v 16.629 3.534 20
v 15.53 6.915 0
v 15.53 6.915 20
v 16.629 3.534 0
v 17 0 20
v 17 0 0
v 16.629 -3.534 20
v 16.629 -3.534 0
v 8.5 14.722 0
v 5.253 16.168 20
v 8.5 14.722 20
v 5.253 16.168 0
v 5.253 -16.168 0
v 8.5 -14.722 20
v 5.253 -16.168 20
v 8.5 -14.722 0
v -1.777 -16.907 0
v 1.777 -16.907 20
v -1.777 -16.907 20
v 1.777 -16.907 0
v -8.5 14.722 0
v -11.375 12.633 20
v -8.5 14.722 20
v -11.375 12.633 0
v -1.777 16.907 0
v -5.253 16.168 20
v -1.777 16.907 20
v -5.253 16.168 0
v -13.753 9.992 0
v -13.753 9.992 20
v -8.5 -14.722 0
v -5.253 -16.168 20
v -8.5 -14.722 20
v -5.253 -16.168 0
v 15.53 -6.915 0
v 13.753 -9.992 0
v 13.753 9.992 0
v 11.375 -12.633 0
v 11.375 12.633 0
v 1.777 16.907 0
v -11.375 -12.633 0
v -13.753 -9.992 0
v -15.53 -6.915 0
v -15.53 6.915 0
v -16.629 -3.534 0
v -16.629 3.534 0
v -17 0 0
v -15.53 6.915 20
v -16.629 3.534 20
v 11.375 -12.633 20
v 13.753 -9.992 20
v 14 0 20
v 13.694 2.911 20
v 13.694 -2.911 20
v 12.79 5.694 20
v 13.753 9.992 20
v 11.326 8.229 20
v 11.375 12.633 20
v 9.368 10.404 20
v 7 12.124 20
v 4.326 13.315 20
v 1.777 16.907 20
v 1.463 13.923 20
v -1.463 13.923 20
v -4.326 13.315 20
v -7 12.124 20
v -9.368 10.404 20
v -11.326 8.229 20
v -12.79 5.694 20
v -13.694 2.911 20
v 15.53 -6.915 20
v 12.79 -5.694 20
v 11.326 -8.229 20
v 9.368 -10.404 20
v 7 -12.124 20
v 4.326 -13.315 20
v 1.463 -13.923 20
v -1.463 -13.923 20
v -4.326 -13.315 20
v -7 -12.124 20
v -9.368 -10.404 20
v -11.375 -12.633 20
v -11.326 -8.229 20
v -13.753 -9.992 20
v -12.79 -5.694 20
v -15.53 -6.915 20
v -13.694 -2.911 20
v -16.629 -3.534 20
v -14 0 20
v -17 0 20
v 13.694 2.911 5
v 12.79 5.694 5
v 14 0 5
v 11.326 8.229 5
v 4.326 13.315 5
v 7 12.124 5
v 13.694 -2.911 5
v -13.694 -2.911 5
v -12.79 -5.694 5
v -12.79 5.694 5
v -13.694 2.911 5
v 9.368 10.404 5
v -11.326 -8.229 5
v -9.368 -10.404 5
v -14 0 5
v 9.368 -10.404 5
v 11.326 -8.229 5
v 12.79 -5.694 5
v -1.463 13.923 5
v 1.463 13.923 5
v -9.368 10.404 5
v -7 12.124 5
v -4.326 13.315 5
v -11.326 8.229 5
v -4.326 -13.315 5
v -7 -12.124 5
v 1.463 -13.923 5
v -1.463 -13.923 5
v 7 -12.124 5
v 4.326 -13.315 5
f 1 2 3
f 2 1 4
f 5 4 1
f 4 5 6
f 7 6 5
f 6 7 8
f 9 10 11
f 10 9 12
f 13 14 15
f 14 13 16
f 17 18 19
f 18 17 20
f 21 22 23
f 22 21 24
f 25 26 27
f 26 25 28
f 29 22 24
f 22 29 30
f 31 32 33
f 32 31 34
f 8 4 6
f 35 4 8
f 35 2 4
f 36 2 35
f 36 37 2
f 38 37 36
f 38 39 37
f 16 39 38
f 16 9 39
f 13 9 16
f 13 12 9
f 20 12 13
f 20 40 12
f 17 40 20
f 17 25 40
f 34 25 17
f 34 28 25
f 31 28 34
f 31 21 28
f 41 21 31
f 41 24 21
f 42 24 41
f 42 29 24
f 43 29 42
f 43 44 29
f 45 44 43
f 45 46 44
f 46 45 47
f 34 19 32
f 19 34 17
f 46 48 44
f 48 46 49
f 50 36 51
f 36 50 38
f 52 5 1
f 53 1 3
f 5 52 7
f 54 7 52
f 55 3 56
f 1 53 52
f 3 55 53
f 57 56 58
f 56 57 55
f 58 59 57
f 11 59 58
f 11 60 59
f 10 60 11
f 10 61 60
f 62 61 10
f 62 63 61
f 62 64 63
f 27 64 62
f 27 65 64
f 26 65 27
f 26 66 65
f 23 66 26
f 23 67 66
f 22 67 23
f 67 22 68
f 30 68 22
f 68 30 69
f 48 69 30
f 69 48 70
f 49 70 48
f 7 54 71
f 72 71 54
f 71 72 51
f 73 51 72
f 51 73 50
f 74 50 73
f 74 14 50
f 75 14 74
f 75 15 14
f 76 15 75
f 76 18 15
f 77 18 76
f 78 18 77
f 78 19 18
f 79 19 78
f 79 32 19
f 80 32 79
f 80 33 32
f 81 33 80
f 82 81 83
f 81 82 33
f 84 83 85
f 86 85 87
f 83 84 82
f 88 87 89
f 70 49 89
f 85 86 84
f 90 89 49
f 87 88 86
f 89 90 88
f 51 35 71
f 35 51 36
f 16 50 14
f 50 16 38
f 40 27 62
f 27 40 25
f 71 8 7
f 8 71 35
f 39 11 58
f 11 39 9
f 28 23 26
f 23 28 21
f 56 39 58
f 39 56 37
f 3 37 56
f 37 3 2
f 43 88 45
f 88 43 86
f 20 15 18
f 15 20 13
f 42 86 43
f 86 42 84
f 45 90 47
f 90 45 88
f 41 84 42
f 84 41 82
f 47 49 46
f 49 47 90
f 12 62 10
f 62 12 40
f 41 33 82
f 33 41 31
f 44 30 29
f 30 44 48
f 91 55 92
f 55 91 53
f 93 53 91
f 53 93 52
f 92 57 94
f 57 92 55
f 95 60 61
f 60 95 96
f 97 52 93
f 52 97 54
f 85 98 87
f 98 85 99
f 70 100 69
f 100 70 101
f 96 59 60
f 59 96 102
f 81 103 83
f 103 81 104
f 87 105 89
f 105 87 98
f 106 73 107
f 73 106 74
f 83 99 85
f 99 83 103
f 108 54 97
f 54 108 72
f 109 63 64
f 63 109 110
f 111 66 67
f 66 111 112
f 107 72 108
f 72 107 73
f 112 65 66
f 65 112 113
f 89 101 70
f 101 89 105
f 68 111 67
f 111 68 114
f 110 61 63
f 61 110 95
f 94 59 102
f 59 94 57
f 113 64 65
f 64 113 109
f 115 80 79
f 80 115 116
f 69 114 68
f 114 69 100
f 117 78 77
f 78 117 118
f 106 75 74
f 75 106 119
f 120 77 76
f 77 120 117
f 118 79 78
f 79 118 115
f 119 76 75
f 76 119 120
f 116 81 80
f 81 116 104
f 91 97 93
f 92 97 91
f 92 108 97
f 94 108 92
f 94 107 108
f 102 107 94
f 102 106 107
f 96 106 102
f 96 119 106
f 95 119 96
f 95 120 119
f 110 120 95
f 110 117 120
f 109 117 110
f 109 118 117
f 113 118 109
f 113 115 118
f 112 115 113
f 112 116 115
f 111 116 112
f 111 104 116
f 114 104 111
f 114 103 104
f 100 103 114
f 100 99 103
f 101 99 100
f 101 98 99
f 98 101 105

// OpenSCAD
//sisähalkaisija 28 => sisäsäde 14
//ulkonema minimi 13  => 15  = 20-5

difference() {
    cylinder(20, 17, 17);
    translate([0,0,5]) 
       cylinder(20, 14, 14);
}
